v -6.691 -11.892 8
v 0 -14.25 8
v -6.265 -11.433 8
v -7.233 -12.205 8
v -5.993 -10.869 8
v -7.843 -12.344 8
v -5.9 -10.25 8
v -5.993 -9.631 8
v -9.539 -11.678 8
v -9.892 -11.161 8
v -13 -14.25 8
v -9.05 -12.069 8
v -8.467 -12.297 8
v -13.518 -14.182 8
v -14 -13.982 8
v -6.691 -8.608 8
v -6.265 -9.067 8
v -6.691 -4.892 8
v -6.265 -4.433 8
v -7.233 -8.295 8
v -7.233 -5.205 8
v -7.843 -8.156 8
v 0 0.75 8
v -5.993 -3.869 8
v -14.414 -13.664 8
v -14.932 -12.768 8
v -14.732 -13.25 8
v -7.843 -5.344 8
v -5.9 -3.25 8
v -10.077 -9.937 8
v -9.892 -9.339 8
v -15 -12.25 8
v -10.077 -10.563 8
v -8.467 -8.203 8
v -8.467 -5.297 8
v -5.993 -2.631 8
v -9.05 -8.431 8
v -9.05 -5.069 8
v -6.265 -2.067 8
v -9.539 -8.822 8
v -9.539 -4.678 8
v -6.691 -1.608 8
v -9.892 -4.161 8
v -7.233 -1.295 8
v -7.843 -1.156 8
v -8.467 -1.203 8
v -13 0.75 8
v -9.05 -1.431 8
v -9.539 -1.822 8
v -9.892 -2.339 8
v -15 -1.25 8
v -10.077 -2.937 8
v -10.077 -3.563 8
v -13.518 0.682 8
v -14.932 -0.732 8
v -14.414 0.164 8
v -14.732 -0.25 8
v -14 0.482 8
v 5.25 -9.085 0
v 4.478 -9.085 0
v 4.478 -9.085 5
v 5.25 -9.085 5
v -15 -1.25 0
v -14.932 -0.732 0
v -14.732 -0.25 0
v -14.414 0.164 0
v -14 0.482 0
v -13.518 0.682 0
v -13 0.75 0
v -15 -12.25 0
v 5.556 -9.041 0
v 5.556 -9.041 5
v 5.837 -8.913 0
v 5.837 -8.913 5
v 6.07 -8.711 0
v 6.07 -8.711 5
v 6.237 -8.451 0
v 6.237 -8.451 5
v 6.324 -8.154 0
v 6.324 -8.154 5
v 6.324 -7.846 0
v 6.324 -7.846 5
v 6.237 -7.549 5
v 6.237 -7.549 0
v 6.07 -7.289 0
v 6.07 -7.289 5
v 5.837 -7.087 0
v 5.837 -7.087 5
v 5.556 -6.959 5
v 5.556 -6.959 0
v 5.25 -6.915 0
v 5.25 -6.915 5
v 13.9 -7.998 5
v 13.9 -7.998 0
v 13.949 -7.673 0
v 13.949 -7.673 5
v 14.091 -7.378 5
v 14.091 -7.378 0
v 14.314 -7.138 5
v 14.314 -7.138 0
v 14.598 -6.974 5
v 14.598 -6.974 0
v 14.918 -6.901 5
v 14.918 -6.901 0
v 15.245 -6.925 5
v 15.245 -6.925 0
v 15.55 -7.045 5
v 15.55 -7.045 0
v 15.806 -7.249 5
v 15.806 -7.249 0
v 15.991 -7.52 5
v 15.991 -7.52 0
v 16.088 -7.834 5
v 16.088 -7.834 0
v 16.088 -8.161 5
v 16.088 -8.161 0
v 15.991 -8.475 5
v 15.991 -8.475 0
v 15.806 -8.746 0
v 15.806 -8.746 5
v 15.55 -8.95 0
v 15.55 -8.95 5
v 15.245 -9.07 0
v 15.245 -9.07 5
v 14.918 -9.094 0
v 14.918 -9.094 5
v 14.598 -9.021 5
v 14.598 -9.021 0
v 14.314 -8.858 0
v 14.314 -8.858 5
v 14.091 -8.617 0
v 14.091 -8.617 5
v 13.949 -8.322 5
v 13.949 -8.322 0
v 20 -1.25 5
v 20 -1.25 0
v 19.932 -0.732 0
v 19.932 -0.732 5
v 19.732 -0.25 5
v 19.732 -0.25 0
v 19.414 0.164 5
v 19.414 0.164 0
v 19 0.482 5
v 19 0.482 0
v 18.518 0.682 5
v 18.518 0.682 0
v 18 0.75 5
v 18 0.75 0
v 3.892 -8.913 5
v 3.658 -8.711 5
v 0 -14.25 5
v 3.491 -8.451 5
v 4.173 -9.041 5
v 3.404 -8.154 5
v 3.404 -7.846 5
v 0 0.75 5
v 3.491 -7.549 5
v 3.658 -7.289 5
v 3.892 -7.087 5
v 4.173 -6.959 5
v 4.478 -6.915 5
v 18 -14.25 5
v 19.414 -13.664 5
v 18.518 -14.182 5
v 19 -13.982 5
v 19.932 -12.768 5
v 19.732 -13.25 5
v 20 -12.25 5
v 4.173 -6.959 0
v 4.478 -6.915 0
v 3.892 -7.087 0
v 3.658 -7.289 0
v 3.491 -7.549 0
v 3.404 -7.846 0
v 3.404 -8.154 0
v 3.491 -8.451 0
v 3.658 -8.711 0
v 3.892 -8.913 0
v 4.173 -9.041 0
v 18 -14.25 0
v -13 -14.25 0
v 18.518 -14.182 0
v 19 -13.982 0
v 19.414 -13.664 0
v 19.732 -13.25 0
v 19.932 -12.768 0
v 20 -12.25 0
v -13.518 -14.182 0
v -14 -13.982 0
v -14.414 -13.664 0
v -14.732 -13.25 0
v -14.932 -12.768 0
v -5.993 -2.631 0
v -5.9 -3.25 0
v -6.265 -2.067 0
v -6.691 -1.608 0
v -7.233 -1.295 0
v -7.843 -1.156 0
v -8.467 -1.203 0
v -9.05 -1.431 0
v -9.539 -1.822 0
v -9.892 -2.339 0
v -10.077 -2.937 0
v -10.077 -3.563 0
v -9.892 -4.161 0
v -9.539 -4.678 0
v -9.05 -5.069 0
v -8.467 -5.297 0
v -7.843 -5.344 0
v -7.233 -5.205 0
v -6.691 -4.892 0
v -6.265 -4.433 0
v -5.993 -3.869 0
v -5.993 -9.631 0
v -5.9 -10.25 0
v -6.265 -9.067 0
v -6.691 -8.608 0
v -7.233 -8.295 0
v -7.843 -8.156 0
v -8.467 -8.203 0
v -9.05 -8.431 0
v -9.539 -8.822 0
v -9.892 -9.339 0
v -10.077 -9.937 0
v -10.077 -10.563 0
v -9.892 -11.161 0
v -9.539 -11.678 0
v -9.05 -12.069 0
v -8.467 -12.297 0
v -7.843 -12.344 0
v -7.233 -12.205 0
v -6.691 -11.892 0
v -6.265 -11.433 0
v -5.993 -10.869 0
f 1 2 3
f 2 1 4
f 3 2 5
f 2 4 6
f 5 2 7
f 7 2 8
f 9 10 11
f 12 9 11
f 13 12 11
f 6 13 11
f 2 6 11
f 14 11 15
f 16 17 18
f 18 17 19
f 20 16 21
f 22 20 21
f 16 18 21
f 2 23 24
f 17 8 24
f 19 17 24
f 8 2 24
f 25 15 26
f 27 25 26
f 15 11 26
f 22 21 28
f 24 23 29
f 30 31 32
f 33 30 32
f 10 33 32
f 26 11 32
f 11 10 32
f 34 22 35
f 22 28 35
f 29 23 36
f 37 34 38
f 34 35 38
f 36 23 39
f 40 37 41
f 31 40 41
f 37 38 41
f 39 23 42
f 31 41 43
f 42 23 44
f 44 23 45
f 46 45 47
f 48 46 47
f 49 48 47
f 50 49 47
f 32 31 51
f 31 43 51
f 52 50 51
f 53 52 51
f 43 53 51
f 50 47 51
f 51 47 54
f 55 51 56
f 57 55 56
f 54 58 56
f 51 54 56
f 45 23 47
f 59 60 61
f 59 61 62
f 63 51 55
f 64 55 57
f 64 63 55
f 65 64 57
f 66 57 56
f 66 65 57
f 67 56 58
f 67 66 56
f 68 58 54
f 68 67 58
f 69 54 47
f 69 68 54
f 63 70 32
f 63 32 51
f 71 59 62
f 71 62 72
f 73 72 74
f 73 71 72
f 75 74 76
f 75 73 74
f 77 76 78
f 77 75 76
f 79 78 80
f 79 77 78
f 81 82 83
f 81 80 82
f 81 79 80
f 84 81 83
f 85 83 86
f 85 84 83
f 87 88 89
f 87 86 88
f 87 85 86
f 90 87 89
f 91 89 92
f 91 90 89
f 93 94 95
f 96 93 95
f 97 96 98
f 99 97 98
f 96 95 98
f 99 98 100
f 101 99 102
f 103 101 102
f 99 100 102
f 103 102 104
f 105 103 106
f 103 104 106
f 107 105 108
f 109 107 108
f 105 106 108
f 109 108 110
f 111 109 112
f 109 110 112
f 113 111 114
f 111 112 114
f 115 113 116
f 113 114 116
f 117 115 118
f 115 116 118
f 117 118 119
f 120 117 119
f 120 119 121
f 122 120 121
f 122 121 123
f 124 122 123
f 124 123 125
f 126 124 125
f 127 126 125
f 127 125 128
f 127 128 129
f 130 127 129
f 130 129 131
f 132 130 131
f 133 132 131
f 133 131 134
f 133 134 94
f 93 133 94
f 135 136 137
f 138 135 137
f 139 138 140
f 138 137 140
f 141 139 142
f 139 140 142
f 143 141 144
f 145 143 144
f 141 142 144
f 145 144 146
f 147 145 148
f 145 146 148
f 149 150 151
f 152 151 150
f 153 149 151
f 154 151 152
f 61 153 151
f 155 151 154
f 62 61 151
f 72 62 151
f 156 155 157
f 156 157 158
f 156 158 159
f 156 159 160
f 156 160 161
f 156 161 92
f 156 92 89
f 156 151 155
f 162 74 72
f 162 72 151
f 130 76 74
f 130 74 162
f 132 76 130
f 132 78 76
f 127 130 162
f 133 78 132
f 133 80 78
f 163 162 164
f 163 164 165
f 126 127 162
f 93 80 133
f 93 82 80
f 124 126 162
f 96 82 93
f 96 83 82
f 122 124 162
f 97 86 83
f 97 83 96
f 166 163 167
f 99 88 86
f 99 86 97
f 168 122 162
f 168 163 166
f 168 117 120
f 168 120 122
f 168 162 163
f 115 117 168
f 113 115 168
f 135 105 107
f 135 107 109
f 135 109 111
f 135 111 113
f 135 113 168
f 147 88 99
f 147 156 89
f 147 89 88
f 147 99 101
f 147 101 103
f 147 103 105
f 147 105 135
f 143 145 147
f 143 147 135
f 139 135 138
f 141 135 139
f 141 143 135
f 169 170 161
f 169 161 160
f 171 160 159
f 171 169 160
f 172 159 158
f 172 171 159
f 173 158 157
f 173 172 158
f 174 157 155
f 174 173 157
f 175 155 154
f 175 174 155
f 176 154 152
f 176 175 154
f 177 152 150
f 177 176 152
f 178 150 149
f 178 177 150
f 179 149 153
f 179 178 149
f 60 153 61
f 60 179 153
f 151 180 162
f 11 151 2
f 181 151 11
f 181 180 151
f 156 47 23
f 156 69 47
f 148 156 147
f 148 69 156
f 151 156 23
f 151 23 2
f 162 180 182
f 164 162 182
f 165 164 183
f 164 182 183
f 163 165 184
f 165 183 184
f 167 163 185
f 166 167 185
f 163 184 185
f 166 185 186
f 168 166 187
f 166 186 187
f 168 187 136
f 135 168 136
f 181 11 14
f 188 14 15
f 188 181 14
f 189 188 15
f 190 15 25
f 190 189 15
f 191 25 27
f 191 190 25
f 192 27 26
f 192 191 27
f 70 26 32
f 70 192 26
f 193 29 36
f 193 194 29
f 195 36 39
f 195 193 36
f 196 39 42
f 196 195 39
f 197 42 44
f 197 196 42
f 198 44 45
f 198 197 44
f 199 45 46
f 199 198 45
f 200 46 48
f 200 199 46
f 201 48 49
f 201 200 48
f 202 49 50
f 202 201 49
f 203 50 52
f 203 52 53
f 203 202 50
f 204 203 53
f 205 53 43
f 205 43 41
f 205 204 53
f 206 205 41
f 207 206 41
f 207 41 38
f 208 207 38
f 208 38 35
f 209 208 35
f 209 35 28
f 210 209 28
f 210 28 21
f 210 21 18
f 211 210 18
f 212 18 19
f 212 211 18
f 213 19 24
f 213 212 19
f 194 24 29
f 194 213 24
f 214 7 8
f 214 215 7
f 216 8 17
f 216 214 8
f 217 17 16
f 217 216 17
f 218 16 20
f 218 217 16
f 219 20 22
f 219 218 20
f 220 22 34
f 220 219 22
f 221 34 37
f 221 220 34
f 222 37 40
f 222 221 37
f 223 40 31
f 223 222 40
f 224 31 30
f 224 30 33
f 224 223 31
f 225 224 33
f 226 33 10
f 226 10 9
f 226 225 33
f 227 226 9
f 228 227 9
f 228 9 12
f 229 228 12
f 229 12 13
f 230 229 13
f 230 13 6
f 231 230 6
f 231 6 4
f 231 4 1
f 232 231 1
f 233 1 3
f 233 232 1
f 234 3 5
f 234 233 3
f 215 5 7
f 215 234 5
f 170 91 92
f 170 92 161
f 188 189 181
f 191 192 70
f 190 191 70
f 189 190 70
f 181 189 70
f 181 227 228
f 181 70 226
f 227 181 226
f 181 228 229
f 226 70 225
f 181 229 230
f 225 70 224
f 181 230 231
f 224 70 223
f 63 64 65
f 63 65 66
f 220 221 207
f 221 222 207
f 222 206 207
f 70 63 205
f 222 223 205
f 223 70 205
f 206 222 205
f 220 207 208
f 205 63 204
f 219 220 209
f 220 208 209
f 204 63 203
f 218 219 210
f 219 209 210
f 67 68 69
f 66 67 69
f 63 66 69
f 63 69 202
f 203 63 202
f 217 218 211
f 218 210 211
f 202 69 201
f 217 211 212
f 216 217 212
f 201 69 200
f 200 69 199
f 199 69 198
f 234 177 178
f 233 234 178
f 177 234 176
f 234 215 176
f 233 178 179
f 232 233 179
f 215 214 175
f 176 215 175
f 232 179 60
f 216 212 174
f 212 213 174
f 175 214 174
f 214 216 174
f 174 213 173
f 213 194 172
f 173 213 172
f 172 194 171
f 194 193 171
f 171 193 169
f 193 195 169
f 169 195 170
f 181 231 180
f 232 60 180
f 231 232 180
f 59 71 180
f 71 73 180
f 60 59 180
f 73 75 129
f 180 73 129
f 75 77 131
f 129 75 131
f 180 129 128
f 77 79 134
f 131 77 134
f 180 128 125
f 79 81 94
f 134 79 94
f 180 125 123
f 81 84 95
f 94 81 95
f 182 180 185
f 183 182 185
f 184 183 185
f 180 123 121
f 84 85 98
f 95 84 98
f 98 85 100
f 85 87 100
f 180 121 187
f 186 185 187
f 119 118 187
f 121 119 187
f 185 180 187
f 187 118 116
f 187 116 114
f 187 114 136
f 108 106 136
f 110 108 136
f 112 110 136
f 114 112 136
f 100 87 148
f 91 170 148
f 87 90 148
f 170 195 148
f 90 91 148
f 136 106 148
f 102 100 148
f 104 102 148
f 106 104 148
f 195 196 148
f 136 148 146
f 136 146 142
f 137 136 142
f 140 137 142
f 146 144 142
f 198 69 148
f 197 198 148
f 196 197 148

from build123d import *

# Parameters (mm, degrees)
ESQUISSE2_R             = 2.1
BOSS_EXTRU_1_DEPTH      = 5
ESQUISSE4_R             = 2.1
BOSS_EXTRU_2_DEPTH      = 3
ESQUISSE6_R             = 1.1
ENL_V_MAT_EXTRU_1_DEPTH = 10


with BuildPart() as part:
    # Esquisse2 → Boss.-Extru.1 (new body)
    with BuildSketch(Plane.XY):
        with BuildLine():
            Line((18, 0.75), (-13, 0.75))
            ThreePointArc((-13, 0.75), (-14.414213562, 0.164213562), (-15, -1.25))
            Line((-15, -1.25), (-15, -12.25))
            ThreePointArc((-15, -12.25), (-14.414213562, -13.664213562), (-13, -14.25))
            Line((-13, -14.25), (18, -14.25))
            ThreePointArc((18, -14.25), (19.414213562, -13.664213562), (20, -12.25))
            Line((20, -12.25), (20, -1.25))
            ThreePointArc((20, -1.25), (19.414213562, 0.164213562), (18, 0.75))
        make_face()
        with Locations((-8, -10.25)):
            Circle(ESQUISSE2_R, mode=Mode.SUBTRACT)
        with Locations((-8, -3.25)):
            Circle(ESQUISSE2_R, mode=Mode.SUBTRACT)
    extrude(amount=BOSS_EXTRU_1_DEPTH)

    # Esquisse4 → Boss.-Extru.2 (add)
    with BuildSketch(Plane.XY.offset(5)):
        with BuildLine():
            Line((0, 0.75), (0, -14.25))
            Line((0, -14.25), (-13, -14.25))
            ThreePointArc((-13, -14.25), (-14.414213562, -13.664213562), (-15, -12.25))
            Line((-15, -12.25), (-15, -1.25))
            ThreePointArc((-15, -1.25), (-14.414213562, 0.164213562), (-13, 0.75))
            Line((-13, 0.75), (0, 0.75))
        make_face()
        with Locations((-8, -10.25)):
            Circle(ESQUISSE4_R, mode=Mode.SUBTRACT)
        with Locations((-8, -3.25)):
            Circle(ESQUISSE4_R, mode=Mode.SUBTRACT)
    extrude(amount=BOSS_EXTRU_2_DEPTH)

    # Esquisse6 → Enlèv. mat.-Extru.1 (cut)
    with BuildSketch(Plane(origin=(0, 0, 0), x_dir=(-1, 0, 0), z_dir=(0, 0, -1))):
        with Locations((-15, -7.997523441)):
            Circle(ESQUISSE6_R)
        with BuildLine():
            Line((-5.249999883, -6.914758131), (-4.478449657, -6.914758131))
            ThreePointArc((-4.478449657, -6.914758131), (-3.393207978, -7.99999981), (-4.478449657, -9.085241489))
            Line((-4.478449657, -9.085241489), (-5.249999883, -9.085241489))
            ThreePointArc((-5.249999883, -9.085241489), (-6.335241562, -7.99999981), (-5.249999883, -6.914758131))
        make_face()
    extrude(amount=-ENL_V_MAT_EXTRU_1_DEPTH, mode=Mode.SUBTRACT)


solid = part.part
